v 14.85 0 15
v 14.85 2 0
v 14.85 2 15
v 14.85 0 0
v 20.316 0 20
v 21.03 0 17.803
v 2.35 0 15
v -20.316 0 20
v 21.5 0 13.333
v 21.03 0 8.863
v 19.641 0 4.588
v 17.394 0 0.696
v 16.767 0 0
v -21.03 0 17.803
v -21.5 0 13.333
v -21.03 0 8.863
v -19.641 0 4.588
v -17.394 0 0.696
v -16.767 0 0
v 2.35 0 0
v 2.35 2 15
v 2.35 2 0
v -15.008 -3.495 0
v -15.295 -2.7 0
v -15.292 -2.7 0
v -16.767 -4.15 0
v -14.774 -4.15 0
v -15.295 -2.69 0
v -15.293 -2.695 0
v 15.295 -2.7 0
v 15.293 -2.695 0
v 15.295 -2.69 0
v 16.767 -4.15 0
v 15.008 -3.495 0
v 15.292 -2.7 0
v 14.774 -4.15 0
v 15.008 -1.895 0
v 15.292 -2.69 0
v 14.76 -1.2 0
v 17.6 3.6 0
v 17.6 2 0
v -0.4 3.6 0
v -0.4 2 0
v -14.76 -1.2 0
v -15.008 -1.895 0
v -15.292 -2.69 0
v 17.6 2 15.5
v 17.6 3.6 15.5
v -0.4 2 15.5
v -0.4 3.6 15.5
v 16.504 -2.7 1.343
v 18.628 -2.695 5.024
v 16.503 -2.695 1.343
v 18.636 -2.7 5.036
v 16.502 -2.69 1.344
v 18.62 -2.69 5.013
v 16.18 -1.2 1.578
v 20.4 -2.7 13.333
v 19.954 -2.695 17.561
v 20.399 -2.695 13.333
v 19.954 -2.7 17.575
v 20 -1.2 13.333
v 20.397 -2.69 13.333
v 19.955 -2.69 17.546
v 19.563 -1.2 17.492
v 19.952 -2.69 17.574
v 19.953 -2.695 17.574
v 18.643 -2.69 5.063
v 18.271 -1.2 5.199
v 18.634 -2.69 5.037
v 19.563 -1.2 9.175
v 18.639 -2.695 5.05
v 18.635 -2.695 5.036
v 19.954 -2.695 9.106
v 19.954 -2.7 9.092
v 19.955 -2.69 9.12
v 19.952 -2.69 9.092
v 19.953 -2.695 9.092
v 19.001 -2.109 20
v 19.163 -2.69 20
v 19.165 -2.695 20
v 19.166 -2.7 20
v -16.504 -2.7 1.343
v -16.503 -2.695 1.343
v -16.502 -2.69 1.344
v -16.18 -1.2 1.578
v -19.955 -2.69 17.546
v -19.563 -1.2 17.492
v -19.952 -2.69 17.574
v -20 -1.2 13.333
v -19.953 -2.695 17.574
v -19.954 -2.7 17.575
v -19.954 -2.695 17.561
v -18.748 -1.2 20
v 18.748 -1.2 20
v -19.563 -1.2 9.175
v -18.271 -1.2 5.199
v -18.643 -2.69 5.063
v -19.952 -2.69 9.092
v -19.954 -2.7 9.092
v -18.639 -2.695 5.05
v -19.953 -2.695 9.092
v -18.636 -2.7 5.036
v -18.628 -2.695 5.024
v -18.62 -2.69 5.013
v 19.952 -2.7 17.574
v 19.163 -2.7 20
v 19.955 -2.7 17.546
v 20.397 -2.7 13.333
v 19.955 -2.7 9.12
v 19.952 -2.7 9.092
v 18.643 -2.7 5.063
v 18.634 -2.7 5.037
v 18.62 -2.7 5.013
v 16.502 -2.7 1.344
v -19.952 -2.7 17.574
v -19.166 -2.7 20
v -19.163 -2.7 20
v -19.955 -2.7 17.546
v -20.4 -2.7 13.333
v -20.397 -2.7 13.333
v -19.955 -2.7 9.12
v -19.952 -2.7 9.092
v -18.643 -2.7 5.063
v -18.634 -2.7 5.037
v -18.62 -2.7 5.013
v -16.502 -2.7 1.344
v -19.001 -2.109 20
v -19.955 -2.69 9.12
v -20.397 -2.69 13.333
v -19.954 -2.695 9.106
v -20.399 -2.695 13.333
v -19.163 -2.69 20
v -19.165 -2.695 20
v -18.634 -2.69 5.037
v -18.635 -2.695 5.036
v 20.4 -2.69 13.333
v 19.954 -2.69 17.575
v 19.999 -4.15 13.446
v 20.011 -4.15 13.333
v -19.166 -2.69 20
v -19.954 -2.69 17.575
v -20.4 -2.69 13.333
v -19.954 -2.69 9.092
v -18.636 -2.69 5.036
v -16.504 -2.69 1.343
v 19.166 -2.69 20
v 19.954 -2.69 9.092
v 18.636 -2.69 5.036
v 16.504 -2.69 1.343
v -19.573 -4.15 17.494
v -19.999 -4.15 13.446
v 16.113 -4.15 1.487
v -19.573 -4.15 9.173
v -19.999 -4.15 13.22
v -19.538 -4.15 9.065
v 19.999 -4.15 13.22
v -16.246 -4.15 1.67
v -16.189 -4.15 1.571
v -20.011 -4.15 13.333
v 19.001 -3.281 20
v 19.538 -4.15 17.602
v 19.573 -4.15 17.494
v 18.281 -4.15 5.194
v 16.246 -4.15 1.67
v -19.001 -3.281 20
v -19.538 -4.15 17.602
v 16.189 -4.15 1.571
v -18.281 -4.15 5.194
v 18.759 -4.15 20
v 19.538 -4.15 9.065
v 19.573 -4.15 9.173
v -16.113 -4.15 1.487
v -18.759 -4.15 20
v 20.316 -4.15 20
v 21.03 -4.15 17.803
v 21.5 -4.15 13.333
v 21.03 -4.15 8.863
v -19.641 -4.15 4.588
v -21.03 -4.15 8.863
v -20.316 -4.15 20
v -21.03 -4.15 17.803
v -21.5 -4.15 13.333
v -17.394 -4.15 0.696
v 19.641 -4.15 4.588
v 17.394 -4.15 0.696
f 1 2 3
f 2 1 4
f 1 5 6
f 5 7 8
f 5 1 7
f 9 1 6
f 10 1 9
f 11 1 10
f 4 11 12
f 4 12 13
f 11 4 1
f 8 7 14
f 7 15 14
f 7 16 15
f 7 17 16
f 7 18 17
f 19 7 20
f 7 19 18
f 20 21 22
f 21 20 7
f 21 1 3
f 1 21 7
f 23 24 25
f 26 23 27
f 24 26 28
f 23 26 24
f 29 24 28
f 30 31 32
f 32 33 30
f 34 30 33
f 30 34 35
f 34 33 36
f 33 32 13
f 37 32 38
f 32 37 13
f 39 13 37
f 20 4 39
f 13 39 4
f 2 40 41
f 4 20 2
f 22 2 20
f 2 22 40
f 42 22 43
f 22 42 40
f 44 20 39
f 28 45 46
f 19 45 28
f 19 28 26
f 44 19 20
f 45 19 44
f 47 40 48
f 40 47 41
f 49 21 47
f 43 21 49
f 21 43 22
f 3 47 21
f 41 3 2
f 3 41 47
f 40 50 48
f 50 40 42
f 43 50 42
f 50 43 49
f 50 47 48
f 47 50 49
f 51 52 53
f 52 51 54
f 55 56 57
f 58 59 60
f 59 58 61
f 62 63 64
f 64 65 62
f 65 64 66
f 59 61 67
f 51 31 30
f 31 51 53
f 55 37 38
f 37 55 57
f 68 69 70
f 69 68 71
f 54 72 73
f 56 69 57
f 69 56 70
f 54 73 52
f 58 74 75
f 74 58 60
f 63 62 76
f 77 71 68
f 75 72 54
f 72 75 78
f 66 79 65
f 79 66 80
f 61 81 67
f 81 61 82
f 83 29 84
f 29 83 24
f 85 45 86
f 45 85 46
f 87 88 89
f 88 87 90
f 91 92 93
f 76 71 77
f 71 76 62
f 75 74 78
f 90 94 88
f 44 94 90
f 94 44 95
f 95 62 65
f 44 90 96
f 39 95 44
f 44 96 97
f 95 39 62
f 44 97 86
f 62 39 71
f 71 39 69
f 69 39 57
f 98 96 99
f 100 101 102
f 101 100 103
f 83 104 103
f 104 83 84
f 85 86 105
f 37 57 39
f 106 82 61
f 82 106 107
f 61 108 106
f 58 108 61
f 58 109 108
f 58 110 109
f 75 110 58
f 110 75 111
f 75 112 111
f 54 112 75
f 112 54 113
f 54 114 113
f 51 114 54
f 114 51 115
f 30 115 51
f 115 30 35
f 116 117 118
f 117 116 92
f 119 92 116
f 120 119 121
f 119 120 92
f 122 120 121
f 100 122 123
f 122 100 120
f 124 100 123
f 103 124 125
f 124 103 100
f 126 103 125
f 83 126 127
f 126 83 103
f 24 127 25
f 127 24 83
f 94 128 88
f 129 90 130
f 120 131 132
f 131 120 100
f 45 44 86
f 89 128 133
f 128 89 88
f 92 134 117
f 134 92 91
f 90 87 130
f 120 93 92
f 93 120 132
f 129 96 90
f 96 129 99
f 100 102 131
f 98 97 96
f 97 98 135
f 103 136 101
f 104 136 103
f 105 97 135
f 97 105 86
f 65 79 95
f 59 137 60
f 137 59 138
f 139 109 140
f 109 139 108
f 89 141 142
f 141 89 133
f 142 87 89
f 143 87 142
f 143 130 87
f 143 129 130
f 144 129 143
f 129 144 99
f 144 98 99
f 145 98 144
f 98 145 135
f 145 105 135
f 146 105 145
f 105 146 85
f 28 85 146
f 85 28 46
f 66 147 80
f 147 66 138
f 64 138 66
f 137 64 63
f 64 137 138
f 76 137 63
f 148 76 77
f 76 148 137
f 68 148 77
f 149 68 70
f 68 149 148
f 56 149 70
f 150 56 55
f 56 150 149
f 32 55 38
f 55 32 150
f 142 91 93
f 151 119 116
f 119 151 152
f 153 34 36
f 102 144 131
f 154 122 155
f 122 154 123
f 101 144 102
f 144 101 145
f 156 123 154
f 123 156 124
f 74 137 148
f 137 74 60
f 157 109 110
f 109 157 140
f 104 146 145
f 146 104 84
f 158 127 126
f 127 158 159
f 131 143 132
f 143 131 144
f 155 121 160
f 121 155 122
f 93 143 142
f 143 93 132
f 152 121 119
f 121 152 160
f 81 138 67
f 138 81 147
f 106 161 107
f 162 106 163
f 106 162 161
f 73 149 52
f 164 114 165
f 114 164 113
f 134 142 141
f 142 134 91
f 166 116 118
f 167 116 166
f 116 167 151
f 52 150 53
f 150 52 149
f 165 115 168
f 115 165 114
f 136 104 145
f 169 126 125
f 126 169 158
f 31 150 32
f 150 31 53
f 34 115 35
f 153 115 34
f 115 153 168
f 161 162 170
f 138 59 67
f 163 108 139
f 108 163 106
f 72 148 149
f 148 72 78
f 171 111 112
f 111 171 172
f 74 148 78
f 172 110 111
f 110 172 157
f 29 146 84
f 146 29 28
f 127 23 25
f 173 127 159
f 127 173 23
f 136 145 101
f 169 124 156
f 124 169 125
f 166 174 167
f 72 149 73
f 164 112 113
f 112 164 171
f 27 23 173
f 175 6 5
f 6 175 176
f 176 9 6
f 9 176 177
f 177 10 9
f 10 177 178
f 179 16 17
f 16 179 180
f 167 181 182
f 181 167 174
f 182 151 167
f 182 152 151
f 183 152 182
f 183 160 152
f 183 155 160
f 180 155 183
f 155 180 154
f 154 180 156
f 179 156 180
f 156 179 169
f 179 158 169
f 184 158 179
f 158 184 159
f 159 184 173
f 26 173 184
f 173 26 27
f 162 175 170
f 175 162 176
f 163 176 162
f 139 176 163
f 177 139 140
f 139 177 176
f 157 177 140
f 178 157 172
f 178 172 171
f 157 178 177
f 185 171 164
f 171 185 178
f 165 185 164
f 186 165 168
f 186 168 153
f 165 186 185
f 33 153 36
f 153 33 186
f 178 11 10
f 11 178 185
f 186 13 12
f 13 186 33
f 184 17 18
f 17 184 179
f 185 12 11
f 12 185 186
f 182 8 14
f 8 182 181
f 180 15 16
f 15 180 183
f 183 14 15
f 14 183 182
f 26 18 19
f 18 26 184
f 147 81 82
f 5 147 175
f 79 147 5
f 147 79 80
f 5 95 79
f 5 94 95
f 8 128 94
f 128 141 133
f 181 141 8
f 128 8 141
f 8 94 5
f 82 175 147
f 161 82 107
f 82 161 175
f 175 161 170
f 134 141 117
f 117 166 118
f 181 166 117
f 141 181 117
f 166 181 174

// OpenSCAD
/* [Global] */

// Inner diameter (40: SELP1640, 52: Sigma 30mm F1.4 DC DN C, 67: Samyang/Rokinon 12mm f2 NCS CS)
Diameter = 40; // [40:100]

// Cover the pop-up flash (makes sense above 67mm)
CoverFlash = 0; // [1:true, 0:false]

/* [Hidden] */

ShoeThickness = 1.6;

LensCap(Diameter, ShoeThickness, CoverFlash);

module LensCapSling(diameter)
{
    difference()
    {
        union()
        {
            SlingAdapter(diameter);
            translate([0,diameter/15,0]) LensCylinder(diameter, 4);
        }
        SlingCropCubes(diameter);
    }
}

module LensCap(diameter, shoeThickness, coverFlash)
{
    rotate([90, 0, 0])
    {
        difference()
        {
            union()
            {
                HotShoeAdapter(diameter, shoeThickness, coverFlash);
                LensCylinder(diameter, 3);
            }
            CropCubes(diameter);
        }
    }
}

module LensCylinder(innerDiameter, rimHeight)
{
    outerDiameter = innerDiameter + 3.0;
    difference ()
    {
        totalHeight = rimHeight + 1.15;
        translate([0,innerDiameter/3,totalHeight/2]) cylinder(h=totalHeight,d=outerDiameter, center = true);
        union()
        {
            translate([0,innerDiameter/3,rimHeight/4+1.25-0.05]) cylinder(h=rimHeight/2, d1=innerDiameter, d2=innerDiameter+0.8, center = true);
            translate([0,innerDiameter/3,rimHeight/4*3+1.25-0.06]) cylinder(h=rimHeight/2, d1=innerDiameter+0.8, d2=innerDiameter, center = true);
        }
    }
}

module HotShoeAdapter(capDiameter, shoeThickness, coverFlash)
{
    union()
    {
        if (coverFlash == 1)
        {
            x = capDiameter / 2 - (9 + 25.4);
            translate([x,7.5,-1]) cube([12.5,15,2], center = true);
            translate([x,7.75,-2-shoeThickness/2]) cube([18,15.5,shoeThickness], center = true);
        }
        else
        {
            x = capDiameter / 2 - (9 + 2.4);
            translate([x,7.5,-1]) cube([12.5,15,2], center = true);
            translate([x,7.75,-2-shoeThickness/2]) cube([18,15.5,shoeThickness], center = true);
        }
    }
}

module SlingAdapter(capDiameter)
{
    difference()
    {
        x = capDiameter;
        translate([0,x/2,-2]) cube([12.4,x,4], center = true);
        translate([0,x/2+0.1,-1.6]) cube([10,x+0.2,2.4], center = true);
    }
}

module CropCubes(lensDiameter)
{
    // if the cap is bigger than 100mm it may result in strange forms
    cubeSide = 200;
    union()
    {
        translate([0, cubeSide/2 + lensDiameter*0.5, 0]) cube(cubeSide, center = true);
        translate([0, -cubeSide/2, 0]) cube(cubeSide, center = true);
    }
 }
 
module SlingCropCubes(lensDiameter)
{
    cubeSide = 200;
    union()
    {
        translate([0, cubeSide/2 + lensDiameter*0.8, 0]) cube(cubeSide, center = true);
        translate([0, -cubeSide/2, 0]) cube(cubeSide, center = true);
    }
}
